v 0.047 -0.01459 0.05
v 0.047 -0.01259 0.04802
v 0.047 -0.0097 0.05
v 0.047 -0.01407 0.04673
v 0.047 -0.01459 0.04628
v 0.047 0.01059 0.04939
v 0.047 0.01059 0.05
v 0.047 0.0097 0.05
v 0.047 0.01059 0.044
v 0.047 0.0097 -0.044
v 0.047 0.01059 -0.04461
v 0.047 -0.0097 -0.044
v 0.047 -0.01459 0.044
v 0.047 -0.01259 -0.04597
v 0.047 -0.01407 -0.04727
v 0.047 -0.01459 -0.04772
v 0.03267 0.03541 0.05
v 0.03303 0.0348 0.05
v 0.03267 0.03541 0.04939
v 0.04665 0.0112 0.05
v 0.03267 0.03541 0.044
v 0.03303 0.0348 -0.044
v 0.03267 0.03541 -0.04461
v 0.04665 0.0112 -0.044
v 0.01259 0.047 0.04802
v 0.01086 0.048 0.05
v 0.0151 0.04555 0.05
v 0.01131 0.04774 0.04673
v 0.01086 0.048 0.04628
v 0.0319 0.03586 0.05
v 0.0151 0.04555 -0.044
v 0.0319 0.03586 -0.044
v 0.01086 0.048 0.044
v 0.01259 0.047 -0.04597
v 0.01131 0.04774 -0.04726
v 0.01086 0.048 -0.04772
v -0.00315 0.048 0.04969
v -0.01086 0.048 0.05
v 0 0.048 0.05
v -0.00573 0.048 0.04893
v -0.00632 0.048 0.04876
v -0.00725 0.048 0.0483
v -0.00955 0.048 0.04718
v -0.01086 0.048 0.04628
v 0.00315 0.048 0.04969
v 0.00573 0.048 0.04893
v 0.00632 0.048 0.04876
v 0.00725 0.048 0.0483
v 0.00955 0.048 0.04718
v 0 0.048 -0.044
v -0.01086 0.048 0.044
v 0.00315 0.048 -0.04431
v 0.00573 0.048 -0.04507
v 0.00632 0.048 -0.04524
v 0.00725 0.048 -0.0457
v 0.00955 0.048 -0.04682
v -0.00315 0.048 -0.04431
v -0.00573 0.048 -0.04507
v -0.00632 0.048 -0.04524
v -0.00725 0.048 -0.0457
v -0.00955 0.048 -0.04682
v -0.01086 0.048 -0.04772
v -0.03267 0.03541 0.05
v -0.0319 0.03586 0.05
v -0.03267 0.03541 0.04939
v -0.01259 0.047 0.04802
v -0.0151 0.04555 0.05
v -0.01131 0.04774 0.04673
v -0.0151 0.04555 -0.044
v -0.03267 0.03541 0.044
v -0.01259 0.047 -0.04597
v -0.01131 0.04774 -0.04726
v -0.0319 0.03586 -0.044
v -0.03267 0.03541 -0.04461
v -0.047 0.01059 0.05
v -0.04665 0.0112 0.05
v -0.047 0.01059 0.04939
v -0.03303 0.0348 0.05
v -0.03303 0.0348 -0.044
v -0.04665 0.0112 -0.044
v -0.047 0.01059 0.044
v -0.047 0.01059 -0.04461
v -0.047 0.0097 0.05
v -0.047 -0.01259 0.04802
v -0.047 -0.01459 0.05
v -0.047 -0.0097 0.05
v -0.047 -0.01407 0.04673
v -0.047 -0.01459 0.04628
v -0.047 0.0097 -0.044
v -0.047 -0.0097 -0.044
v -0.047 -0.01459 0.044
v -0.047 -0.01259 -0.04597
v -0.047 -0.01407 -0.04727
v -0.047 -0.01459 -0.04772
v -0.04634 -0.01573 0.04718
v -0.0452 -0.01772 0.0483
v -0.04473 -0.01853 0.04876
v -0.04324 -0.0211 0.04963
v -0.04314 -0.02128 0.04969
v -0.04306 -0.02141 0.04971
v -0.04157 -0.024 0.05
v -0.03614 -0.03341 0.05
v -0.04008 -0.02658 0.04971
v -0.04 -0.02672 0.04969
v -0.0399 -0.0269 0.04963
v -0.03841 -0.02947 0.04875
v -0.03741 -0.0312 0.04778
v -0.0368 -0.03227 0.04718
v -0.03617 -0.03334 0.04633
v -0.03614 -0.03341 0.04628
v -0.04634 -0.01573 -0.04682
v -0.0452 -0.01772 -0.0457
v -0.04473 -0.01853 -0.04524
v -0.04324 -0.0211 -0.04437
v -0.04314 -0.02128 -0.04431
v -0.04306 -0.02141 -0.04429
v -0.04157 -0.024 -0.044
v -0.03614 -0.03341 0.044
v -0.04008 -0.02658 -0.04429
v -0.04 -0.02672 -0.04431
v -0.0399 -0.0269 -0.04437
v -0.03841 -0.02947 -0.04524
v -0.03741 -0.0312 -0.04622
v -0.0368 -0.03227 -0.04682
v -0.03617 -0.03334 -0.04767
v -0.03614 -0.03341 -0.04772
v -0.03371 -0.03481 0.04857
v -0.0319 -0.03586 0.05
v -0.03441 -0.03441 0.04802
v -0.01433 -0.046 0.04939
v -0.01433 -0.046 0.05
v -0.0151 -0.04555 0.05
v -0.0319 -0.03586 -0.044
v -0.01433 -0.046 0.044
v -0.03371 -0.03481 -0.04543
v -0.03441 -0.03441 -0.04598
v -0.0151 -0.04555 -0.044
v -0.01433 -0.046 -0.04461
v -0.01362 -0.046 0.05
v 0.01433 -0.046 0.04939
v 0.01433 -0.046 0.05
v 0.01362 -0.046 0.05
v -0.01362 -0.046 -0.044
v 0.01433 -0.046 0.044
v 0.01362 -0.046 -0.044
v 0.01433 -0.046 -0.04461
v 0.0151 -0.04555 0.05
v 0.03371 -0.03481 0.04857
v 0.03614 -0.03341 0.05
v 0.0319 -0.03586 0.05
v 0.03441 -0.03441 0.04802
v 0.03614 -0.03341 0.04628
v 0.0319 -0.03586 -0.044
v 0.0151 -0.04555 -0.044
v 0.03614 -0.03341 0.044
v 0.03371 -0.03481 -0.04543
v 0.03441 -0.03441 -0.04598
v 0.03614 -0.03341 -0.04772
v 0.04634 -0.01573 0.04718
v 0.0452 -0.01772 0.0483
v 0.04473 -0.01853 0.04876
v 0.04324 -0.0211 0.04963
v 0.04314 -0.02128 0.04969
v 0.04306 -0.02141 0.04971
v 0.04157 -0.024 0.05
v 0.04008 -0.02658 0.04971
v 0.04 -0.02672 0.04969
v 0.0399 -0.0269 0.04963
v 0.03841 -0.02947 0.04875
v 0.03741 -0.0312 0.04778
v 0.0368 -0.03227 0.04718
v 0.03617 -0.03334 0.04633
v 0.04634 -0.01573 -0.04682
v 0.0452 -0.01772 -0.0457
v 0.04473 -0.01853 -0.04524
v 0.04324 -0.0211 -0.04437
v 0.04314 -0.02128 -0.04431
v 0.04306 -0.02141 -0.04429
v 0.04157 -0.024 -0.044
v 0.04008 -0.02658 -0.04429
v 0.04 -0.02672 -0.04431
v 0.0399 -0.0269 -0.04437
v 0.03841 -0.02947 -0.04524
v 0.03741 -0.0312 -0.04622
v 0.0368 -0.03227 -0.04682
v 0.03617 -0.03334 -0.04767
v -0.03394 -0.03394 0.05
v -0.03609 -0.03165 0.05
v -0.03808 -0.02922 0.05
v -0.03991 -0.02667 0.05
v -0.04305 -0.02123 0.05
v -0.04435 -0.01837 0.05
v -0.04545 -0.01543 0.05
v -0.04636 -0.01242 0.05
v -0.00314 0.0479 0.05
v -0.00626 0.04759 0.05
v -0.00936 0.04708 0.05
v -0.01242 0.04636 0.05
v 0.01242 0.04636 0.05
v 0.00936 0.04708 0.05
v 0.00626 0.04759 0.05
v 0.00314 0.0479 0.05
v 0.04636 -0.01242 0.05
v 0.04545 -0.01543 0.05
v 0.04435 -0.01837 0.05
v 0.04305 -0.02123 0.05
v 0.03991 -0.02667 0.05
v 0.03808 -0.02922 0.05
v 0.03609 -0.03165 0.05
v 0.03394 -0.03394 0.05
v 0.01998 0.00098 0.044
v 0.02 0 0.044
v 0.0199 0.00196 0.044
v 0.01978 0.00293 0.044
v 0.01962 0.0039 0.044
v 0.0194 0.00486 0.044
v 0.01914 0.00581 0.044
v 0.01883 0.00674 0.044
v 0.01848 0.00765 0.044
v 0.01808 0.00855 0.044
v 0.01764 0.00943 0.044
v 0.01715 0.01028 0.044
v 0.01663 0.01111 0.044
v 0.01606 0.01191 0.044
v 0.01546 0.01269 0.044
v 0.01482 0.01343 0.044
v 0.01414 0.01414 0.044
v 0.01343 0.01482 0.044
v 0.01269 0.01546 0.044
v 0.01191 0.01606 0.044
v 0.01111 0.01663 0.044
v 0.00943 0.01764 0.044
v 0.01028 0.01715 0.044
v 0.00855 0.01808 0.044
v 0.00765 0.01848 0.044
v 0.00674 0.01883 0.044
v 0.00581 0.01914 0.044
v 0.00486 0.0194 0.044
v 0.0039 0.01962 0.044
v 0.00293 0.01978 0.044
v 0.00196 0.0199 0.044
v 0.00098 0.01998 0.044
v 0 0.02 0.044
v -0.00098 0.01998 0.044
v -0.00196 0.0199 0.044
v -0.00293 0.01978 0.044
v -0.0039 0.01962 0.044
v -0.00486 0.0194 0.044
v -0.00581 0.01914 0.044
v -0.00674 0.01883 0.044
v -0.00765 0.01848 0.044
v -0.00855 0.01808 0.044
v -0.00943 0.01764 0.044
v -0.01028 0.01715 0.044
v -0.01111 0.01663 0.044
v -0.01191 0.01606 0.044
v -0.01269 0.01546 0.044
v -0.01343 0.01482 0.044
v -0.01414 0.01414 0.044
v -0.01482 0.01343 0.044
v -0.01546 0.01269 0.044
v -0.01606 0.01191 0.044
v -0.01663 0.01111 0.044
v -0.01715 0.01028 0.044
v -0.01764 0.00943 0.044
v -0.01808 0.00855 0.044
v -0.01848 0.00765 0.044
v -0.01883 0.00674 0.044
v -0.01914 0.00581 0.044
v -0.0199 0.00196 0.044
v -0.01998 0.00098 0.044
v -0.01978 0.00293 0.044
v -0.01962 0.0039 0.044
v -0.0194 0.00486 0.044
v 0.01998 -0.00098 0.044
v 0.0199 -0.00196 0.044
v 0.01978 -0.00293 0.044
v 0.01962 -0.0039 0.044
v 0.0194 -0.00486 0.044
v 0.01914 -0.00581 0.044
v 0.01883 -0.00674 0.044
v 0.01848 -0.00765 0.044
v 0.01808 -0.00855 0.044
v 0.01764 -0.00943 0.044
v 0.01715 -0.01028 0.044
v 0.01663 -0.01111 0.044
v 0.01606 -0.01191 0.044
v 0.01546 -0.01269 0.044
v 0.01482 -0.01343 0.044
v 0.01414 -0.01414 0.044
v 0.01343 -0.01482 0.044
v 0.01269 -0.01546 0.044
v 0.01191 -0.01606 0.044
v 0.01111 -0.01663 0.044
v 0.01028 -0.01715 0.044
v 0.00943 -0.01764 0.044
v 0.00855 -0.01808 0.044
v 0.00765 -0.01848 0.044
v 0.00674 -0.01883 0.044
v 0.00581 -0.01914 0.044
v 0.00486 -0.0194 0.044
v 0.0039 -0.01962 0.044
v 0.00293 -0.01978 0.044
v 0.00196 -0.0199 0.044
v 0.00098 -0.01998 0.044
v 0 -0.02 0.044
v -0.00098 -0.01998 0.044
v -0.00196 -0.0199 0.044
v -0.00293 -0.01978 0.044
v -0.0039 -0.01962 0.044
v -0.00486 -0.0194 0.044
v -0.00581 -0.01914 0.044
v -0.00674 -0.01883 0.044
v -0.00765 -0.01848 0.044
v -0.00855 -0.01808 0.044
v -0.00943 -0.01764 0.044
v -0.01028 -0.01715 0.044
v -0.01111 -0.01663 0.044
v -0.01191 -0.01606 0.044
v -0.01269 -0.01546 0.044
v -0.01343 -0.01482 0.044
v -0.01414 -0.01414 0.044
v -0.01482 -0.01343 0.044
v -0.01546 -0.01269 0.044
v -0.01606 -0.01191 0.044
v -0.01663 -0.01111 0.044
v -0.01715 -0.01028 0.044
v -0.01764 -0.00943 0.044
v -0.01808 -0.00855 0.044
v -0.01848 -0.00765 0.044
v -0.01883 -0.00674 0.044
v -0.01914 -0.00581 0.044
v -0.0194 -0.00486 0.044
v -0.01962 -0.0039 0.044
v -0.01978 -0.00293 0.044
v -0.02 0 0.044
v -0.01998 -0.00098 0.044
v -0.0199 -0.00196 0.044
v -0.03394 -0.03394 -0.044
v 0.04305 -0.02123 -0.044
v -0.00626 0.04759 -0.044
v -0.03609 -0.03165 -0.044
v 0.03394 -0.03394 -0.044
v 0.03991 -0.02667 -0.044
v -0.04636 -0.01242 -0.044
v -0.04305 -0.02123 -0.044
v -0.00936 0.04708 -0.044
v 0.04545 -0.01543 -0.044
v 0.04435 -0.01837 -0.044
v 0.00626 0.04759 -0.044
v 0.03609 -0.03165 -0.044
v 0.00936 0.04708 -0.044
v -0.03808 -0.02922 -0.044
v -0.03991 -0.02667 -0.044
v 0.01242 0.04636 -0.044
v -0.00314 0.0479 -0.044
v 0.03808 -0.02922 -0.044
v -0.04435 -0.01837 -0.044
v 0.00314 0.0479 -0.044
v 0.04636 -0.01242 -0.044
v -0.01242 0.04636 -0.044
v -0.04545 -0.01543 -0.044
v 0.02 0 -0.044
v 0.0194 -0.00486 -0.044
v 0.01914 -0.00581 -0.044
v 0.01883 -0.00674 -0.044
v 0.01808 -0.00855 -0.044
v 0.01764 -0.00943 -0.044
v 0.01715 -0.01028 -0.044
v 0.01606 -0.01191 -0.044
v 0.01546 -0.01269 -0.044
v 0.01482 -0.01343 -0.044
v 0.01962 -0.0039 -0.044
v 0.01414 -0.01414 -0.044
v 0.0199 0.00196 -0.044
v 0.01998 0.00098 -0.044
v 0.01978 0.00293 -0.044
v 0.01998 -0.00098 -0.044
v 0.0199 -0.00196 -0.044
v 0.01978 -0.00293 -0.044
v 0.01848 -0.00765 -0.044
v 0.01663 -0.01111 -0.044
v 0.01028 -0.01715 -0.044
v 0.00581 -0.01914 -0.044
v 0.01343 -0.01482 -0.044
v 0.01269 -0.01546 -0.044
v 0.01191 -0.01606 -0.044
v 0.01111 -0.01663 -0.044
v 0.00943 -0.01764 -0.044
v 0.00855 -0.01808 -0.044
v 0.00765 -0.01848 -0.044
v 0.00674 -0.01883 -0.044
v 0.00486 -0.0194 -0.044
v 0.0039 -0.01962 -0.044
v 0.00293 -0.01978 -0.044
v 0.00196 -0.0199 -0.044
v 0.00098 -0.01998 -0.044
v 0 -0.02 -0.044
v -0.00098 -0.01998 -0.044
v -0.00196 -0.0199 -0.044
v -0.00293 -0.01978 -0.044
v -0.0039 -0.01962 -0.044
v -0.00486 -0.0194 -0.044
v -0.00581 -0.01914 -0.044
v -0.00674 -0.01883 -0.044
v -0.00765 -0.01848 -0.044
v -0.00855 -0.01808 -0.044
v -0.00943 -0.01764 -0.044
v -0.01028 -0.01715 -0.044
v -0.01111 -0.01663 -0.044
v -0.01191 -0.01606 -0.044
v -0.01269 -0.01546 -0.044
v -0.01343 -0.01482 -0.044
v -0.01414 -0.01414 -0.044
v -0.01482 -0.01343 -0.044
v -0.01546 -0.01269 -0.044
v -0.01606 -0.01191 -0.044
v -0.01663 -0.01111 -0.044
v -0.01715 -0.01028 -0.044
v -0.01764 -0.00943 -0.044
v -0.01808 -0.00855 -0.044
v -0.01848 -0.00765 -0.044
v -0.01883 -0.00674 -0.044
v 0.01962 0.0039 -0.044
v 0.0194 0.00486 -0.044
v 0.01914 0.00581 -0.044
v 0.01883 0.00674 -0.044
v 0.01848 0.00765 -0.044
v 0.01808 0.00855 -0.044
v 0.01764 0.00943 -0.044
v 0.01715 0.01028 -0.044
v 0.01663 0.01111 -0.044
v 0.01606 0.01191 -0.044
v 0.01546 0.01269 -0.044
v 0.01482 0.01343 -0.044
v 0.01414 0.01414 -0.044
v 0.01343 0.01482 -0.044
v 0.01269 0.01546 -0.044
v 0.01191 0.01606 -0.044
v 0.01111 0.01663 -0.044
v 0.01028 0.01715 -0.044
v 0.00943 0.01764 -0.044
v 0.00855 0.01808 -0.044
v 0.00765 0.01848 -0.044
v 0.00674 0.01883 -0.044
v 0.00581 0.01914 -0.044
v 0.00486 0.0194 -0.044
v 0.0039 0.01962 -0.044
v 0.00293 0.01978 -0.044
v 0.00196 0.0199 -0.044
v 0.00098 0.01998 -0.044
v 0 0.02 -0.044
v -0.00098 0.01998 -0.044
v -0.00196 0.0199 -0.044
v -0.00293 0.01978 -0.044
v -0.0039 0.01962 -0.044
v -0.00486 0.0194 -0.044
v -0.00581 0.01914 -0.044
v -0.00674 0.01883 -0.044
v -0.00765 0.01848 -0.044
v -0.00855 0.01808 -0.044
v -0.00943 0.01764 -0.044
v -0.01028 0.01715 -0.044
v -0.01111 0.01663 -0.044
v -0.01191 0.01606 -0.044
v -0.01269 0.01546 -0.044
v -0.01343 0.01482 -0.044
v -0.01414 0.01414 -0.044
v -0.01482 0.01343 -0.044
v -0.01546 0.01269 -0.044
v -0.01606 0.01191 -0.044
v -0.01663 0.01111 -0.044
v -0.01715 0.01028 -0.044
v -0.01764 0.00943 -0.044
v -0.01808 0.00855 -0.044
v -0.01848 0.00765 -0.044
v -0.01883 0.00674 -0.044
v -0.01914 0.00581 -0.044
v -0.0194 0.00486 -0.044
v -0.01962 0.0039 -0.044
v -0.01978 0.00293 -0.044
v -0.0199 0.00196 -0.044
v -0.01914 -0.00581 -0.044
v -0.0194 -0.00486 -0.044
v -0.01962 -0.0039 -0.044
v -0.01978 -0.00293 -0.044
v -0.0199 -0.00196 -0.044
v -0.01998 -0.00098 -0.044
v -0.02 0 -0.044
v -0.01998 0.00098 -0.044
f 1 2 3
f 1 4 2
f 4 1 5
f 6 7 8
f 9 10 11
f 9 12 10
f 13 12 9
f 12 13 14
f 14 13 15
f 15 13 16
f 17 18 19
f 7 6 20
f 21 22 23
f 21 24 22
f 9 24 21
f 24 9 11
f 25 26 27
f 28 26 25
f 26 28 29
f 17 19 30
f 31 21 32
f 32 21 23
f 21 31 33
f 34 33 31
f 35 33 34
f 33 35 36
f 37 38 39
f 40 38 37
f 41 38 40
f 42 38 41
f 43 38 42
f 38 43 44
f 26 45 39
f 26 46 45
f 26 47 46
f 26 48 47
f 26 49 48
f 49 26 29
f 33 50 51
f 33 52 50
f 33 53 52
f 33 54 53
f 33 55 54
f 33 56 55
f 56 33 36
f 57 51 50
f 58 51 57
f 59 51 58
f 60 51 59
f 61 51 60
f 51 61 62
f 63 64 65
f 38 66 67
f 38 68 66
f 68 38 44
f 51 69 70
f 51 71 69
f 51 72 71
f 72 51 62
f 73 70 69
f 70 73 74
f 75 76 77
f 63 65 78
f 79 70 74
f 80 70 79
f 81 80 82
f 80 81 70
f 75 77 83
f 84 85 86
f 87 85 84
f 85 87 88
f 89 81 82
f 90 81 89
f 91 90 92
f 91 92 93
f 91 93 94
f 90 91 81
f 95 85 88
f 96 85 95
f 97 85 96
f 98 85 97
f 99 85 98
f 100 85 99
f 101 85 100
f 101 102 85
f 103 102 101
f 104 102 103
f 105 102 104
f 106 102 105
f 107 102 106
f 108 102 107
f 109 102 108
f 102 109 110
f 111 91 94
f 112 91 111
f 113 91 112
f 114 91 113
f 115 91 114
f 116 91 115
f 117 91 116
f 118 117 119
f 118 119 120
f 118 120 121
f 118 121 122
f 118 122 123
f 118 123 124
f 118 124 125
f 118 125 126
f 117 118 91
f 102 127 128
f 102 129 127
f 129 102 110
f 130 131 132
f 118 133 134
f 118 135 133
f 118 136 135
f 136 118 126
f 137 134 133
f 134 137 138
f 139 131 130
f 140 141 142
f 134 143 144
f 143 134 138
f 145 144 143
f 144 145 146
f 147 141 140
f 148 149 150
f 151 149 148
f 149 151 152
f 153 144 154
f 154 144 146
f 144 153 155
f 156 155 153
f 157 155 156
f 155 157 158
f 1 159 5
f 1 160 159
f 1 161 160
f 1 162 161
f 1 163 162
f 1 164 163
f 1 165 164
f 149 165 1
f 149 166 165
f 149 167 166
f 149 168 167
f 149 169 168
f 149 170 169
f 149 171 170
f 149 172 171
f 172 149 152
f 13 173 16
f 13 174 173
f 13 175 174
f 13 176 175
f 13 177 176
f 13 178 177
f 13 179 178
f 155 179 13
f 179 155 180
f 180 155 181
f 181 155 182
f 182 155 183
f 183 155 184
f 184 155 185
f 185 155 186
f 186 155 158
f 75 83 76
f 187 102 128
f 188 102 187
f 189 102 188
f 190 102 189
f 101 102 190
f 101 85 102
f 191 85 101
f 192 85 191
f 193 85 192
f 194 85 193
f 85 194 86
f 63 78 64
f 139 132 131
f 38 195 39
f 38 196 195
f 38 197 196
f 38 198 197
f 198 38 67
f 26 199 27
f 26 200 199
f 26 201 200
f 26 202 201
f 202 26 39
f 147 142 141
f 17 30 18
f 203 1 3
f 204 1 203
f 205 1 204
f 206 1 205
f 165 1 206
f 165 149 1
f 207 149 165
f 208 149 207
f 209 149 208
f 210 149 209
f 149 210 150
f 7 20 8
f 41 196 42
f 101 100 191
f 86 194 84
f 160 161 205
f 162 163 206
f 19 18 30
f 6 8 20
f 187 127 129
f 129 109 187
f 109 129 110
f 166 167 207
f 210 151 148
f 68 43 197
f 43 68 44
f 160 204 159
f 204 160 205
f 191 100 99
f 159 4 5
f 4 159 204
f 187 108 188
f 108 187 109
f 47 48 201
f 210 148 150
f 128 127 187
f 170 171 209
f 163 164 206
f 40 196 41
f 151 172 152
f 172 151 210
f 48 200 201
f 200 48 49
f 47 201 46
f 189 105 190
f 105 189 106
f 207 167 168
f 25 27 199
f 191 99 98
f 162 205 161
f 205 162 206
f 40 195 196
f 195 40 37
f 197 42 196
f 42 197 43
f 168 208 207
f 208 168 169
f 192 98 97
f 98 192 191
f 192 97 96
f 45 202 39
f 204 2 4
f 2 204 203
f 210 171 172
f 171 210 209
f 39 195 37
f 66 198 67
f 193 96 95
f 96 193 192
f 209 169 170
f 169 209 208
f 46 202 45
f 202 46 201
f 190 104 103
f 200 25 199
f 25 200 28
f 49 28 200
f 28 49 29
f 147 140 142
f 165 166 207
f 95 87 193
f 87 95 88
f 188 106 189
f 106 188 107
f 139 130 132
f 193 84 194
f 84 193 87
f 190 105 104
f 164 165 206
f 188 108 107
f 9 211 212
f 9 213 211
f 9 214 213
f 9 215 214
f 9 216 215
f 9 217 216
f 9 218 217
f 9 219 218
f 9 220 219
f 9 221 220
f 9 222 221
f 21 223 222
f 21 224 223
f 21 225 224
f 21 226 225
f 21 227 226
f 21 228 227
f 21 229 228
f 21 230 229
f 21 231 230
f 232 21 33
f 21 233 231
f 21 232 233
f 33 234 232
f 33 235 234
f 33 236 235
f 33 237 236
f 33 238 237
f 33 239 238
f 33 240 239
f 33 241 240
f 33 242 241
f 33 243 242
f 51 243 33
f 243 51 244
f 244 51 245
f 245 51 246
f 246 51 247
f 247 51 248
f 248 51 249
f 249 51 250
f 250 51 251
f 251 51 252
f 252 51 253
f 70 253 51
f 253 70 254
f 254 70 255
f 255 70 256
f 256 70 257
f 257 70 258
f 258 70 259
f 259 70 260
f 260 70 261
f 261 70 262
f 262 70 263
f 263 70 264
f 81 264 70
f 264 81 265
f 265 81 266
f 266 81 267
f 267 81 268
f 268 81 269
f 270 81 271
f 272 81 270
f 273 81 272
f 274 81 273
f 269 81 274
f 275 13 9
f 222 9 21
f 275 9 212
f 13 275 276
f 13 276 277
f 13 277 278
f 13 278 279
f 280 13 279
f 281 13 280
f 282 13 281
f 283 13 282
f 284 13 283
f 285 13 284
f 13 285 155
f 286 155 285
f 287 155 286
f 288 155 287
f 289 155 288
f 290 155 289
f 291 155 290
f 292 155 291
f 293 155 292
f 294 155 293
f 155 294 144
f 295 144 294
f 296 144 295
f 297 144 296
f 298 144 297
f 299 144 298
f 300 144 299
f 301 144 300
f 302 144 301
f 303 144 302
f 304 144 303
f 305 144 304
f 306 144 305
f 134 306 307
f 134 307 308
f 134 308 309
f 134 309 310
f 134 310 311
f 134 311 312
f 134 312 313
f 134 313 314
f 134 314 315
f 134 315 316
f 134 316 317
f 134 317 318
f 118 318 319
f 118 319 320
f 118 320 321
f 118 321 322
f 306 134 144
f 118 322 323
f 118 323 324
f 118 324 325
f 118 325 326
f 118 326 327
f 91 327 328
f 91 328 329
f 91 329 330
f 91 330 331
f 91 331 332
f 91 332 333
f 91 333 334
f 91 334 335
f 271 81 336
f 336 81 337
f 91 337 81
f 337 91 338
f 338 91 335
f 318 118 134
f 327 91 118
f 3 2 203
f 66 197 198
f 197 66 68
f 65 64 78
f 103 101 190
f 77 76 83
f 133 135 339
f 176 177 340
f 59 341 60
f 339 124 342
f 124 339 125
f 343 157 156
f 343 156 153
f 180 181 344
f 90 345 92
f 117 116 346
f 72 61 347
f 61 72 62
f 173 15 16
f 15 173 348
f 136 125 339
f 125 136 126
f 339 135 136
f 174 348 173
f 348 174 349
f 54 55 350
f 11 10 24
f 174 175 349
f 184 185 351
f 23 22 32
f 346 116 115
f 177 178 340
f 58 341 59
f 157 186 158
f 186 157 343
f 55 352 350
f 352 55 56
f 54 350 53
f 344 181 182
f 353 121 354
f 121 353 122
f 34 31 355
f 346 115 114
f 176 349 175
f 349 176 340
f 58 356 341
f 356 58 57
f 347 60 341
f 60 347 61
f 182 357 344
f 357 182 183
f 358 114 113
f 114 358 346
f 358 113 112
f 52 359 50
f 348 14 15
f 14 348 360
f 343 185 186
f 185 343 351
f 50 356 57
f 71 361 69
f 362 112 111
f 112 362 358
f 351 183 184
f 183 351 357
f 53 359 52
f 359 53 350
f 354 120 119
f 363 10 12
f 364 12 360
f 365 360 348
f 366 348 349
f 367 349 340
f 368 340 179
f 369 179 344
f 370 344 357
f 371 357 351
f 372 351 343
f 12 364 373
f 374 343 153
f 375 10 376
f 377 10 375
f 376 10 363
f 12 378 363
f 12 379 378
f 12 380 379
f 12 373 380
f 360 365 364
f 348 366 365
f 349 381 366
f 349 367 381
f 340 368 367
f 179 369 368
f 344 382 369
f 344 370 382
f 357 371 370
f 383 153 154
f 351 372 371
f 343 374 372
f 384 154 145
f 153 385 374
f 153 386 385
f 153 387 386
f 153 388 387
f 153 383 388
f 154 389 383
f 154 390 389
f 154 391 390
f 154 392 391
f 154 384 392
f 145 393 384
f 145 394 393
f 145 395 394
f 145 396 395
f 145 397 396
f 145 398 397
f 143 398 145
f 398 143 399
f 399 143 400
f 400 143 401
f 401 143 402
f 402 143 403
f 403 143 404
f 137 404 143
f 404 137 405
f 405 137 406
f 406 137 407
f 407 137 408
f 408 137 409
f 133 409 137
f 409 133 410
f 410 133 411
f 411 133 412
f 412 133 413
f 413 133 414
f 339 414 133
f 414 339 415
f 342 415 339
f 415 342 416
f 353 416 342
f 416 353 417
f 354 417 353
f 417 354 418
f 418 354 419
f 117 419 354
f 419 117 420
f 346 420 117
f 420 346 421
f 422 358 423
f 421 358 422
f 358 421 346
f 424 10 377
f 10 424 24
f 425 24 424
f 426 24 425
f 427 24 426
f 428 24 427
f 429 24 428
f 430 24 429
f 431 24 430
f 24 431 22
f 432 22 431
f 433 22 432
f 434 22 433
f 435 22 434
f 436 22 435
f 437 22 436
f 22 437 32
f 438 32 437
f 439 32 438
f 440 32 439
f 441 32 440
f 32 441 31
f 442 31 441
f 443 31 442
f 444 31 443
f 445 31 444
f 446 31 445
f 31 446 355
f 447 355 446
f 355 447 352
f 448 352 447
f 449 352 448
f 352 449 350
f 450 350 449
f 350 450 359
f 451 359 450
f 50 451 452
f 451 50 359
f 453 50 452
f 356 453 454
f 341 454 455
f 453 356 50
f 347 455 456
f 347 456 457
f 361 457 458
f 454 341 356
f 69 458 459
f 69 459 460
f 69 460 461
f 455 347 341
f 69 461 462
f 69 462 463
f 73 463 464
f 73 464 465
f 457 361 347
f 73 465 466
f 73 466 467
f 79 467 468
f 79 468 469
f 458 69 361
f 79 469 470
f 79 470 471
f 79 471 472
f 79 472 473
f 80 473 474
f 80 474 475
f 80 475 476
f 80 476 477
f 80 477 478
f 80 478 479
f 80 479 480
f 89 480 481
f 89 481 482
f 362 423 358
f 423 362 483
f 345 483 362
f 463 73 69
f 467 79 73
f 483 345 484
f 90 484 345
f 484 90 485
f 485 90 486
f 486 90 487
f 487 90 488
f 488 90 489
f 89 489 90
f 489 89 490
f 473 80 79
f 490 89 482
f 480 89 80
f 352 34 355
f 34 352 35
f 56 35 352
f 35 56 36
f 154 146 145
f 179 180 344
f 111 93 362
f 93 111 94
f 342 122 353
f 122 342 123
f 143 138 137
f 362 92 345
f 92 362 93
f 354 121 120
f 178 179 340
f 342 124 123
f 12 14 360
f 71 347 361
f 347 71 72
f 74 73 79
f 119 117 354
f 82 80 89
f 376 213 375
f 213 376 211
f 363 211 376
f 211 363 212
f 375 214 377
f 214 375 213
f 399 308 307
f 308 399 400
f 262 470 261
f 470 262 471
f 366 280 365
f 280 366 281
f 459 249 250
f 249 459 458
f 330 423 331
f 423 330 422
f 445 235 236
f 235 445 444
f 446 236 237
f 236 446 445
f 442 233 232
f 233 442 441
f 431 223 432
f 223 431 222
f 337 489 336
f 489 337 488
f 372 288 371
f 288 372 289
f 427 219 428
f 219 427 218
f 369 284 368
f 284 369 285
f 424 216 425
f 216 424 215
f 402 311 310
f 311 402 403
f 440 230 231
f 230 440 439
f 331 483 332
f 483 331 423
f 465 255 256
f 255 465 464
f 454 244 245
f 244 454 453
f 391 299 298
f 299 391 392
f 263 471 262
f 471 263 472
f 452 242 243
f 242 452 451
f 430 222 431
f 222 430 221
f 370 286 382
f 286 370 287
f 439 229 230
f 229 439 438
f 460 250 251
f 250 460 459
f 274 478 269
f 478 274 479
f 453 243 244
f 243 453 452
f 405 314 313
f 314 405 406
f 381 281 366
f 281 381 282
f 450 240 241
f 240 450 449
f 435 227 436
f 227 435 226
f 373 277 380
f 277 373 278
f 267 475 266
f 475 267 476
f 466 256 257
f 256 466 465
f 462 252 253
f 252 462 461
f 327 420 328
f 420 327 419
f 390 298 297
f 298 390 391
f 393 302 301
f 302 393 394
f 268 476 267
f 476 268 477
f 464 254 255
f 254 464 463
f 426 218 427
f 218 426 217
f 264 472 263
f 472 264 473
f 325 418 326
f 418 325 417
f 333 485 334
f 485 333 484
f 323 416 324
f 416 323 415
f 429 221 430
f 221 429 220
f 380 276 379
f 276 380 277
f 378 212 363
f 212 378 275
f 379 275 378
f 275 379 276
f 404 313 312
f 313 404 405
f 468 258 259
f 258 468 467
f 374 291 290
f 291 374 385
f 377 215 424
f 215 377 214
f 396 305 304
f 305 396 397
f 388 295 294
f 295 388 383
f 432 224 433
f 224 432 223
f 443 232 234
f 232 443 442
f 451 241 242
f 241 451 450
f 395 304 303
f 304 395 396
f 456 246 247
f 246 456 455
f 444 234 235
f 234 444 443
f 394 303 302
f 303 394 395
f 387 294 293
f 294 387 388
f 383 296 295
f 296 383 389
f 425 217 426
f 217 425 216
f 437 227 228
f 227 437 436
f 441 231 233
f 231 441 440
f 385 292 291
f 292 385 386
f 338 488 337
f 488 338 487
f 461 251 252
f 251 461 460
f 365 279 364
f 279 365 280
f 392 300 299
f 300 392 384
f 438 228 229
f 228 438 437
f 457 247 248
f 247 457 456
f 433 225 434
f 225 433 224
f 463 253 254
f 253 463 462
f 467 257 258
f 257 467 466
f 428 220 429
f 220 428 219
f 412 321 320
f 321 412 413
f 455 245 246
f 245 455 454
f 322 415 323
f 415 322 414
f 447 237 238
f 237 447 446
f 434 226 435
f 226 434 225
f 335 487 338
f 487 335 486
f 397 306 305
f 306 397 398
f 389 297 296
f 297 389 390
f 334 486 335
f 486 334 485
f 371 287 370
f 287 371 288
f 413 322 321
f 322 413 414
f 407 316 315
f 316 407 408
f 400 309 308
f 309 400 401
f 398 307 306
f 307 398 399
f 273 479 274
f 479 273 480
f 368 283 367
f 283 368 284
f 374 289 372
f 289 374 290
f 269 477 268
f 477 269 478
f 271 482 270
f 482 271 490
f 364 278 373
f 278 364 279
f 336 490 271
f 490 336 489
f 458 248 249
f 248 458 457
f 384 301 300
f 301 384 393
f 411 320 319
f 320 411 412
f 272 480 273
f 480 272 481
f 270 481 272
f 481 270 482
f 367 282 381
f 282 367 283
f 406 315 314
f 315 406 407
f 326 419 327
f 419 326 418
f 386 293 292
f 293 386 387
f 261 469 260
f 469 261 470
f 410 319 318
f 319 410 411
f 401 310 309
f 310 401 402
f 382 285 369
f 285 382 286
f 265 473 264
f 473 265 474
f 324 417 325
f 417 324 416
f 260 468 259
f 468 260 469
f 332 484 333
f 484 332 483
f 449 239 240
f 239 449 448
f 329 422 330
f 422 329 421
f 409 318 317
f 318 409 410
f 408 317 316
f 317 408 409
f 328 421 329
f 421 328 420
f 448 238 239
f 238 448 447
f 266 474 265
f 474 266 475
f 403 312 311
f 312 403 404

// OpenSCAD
// Thick annular ring (washer/bushing-like) with circular through-bore
// Faceted, slightly irregular outer surface
// Bounding box target: 0.1 x 0.1 x 0.1 mm

// ---------- Parameters ----------
bbox = 0.1;                 // mm (target overall X/Y/Z)
height = bbox;              // mm

outer_radius_max = bbox/2;  // 0.05 mm -> overall diameter 0.1 mm
bore_radius = 0.02;         // circular through-bore radius (mm)

facet_count = 12;           // exterior faceting
facet_radial_depth = 0.003; // how much the facets cut in (mm)
irregularity_amp = 0.001;   // slight irregularity (mm)

chamfer_z = 0.006;          // mm
chamfer_radial = 0.002;     // mm

bore_clearance = 0.002;     // extra height for clean subtraction (mm)

// ---------- Helpers ----------
function clamp(x, a, b) = x < a ? a : (x > b ? b : x);

// Ensure outer radius never exceeds bbox/2 after any operation
outer_r = outer_radius_max;
inner_r = clamp(bore_radius, 0, outer_r - 0.001);

// ---------- Geometry ----------
module outer_faceted_irregular_shell() {
    // Start from a true circular cylinder at max radius (guarantees bbox),
    // then subtract shallow "facet" cutters and add tiny irregular bumps.
    difference() {
        // Base outer cylinder (true circle)
        cylinder(h=height, r=outer_r, center=true, $fn=128);

        // Facet cutters: subtract shallow wedges around the perimeter
        // (creates polygonal/faceted exterior while keeping max radius)
        for (i = [0:facet_count-1]) {
            ang = i * 360 / facet_count;

            // Slight per-facet variation (deterministic, no randomness)
            d = facet_radial_depth + irregularity_amp * sin(ang*3);

            // Cutter is a tall box tangent to the cylinder, removing a flat
            rotate([0,0,ang])
                translate([outer_r - d/2, 0, 0])
                    cube([d, 2*outer_r*1.2, height + 2*bore_clearance], center=true);
        }
    }
}

module edge_chamfers() {
    // Subtract small conical frustums at top and bottom outer edge
    union() {
        translate([0, 0, height/2 - chamfer_z/2])
            cylinder(h=chamfer_z, r1=outer_r, r2=outer_r - chamfer_radial, center=true, $fn=96);

        translate([0, 0, -height/2 + chamfer_z/2])
            cylinder(h=chamfer_z, r1=outer_r, r2=outer_r - chamfer_radial, center=true, $fn=96);
    }
}

module circular_through_bore() {
    // Force a truly circular bore with high $fn
    cylinder(h=height + 2*bore_clearance, r=inner_r, center=true, $fn=128);
}

// ---------- Final Solid ----------
difference() {
    // Outer body with faceted/irregular exterior and chamfered edges
    difference() {
        outer_faceted_irregular_shell();
        edge_chamfers();
    }

    // Circular through-hole
    circular_through_bore();
}
